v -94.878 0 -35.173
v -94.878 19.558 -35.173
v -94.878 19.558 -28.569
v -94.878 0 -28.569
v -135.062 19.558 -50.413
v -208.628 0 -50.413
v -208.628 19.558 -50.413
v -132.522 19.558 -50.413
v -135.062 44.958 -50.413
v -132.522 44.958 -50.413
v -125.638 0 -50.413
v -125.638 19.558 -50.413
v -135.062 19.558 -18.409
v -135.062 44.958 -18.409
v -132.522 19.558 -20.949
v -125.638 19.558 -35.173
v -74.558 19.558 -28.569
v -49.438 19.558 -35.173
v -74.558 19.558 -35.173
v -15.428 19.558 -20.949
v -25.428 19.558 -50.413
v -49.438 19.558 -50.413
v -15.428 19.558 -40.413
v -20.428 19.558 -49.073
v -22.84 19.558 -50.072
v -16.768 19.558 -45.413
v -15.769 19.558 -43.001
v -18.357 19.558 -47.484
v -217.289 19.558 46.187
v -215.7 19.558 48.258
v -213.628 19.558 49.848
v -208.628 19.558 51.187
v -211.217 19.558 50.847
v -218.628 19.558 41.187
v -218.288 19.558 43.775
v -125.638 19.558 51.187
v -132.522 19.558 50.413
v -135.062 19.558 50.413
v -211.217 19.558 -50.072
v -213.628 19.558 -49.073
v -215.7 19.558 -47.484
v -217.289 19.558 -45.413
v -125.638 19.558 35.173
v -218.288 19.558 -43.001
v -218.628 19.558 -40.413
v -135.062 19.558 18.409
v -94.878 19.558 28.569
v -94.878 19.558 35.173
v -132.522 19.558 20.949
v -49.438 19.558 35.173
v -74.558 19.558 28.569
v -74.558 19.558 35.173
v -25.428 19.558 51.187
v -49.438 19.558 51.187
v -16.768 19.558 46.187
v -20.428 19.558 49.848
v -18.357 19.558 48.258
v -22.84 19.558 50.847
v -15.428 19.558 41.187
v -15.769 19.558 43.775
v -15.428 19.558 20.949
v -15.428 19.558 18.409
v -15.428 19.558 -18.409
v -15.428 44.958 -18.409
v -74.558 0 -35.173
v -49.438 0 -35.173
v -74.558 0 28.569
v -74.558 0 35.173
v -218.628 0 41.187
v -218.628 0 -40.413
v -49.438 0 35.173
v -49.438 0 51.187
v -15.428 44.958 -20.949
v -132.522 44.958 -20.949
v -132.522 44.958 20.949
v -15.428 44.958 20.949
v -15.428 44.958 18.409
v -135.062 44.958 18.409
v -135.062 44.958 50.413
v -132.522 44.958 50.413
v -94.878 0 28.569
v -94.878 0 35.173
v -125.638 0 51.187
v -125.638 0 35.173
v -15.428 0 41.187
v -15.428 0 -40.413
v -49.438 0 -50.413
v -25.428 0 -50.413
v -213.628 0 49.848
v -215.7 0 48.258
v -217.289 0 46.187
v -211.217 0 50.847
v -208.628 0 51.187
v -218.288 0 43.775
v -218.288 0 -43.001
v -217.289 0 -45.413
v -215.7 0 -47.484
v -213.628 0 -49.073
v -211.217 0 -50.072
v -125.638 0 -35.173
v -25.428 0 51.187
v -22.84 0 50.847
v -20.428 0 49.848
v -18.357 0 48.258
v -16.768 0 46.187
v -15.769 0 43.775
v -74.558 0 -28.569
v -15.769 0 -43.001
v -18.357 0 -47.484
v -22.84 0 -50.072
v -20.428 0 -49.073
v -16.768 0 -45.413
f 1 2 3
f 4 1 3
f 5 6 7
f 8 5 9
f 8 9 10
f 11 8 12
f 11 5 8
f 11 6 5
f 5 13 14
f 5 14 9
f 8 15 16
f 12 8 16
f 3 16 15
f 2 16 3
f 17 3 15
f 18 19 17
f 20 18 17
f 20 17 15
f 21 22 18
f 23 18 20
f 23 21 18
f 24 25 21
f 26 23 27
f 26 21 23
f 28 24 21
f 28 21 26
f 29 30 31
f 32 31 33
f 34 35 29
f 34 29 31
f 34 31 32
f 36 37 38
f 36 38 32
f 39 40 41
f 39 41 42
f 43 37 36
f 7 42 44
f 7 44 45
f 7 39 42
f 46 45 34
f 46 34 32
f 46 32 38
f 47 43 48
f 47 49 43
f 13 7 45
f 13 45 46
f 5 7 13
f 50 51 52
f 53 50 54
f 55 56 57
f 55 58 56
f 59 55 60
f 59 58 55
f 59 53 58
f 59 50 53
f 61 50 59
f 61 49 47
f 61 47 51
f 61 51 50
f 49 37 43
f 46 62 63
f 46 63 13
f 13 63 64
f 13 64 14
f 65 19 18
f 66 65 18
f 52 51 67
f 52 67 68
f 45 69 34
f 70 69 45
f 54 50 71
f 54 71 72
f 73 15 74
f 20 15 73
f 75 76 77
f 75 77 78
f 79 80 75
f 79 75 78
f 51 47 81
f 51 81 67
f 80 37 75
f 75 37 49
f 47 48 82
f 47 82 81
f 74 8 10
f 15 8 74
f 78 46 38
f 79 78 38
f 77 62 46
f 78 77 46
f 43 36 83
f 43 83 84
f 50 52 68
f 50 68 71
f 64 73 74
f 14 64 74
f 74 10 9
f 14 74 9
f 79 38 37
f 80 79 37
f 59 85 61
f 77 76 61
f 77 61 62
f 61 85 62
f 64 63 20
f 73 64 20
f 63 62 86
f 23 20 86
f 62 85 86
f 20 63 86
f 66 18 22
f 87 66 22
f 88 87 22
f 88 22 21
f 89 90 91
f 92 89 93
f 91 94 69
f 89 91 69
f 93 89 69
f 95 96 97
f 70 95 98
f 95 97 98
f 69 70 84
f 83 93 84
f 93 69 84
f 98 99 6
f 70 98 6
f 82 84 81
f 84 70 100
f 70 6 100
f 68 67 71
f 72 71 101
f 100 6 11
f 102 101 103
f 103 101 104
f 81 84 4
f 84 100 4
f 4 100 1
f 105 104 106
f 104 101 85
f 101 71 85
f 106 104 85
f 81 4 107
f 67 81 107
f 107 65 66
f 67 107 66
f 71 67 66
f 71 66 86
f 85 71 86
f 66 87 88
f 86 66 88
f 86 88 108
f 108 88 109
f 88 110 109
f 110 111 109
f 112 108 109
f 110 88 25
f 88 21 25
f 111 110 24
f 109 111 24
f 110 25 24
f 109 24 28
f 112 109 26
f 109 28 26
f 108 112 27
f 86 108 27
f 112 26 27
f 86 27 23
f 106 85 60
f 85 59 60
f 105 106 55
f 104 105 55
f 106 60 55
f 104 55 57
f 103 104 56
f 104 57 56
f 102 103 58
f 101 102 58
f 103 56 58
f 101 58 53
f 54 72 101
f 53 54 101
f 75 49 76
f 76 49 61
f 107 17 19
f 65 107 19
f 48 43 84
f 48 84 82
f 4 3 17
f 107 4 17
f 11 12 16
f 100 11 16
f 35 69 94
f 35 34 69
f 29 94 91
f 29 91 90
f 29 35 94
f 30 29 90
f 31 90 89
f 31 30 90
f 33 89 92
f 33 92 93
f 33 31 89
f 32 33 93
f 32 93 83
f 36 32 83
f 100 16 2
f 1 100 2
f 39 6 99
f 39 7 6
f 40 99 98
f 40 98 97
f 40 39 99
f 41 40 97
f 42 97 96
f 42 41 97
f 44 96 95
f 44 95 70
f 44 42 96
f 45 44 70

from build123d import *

# Parameters (mm, degrees)
SKETCH2_W           = 203.2
SKETCH2_H           = 101.6
BOSS_EXTRUDE1_DEPTH = 19.558
SKETCH3_W           = 76.2
SKETCH3_H           = 5.08
CUT_EXTRUDE2_DEPTH  = 19.558
FILLET1_R           = 10
FILLET2_R           = 10
FILLET3_R           = 10
FILLET4_R           = 10
EXTRUDE_THIN5_DEPTH = 25.4


with BuildPart() as part:
    # Sketch2 → Boss-Extrude1 (new body)
    with BuildSketch(Plane(origin=(-97.482495003, 0, 34.735141898), x_dir=(1, 0, 0), z_dir=(0, 1, 0))):
        with Locations((-19.545959724, 34.347881976)):
            Rectangle(SKETCH2_W, SKETCH2_H)
    extrude(amount=BOSS_EXTRUDE1_DEPTH)

    # Sketch3 → Cut-Extrude2 (cut)
    with BuildSketch(Plane(origin=(-97.482495003, 19.558, 34.735141898), x_dir=(1, 0, 0), z_dir=(0, 1, 0))):
        Polygon((48.044591515, 85.147881976), (-28.155408485, 85.147881976), (-28.155408485, 69.907881976), (-15.015206922, 69.907881976), (2.604442641, 69.907881976), (2.604442641, 63.303881976), (22.924442641, 63.303881976), (22.924442641, 69.907881976), (48.044591515, 69.907881976), align=None)
        with Locations((9.944591515, 87.687881976)):
            Rectangle(SKETCH3_W, SKETCH3_H)
    cut_extrude2 = extrude(amount=-CUT_EXTRUDE2_DEPTH, mode=Mode.SUBTRACT)

    # Mirror4: Cut-Extrude2 across plane
    add(cut_extrude2.mirror(Plane.XY), mode=Mode.SUBTRACT)

    # Fillet1
    fillet1_edges = [part.edges().sort_by_distance(p)[0] for p in [
        (-15.428454726, 9.779, 51.187259921),
    ]]
    fillet(fillet1_edges, radius=FILLET1_R)

    # Fillet2
    fillet2_edges = [part.edges().sort_by_distance(p)[0] for p in [
        (-218.628454726, 9.779, -50.412740079),
    ]]
    fillet(fillet2_edges, radius=FILLET2_R)

    # Fillet3
    fillet3_edges = [part.edges().sort_by_distance(p)[0] for p in [
        (-218.628454726, 9.779, 51.187259921),
    ]]
    fillet(fillet3_edges, radius=FILLET3_R)

    # Fillet4
    fillet4_edges = [part.edges().sort_by_distance(p)[0] for p in [
        (-15.428454726, 9.779, -50.412740079),
    ]]
    fillet(fillet4_edges, radius=FILLET4_R)

    # Sketch7 → Extrude-Thin5 (add)
    with BuildSketch(Plane(origin=(0, 19.558, 0), x_dir=(1, 0, 0), z_dir=(0, 1, 0))):
        Polygon((-132.522454726, 50.412740079), (-132.522454726, 20.948740079), (-15.428454726, 20.948740079), (-15.428454726, 18.408740079), (-135.062454726, 18.408740079), (-135.062454726, 50.412740079), align=None)
    extrude_thin5 = extrude(amount=EXTRUDE_THIN5_DEPTH)

    # Mirror5: Extrude-Thin5 across plane
    add(extrude_thin5.mirror(Plane.XY))


solid = part.part
